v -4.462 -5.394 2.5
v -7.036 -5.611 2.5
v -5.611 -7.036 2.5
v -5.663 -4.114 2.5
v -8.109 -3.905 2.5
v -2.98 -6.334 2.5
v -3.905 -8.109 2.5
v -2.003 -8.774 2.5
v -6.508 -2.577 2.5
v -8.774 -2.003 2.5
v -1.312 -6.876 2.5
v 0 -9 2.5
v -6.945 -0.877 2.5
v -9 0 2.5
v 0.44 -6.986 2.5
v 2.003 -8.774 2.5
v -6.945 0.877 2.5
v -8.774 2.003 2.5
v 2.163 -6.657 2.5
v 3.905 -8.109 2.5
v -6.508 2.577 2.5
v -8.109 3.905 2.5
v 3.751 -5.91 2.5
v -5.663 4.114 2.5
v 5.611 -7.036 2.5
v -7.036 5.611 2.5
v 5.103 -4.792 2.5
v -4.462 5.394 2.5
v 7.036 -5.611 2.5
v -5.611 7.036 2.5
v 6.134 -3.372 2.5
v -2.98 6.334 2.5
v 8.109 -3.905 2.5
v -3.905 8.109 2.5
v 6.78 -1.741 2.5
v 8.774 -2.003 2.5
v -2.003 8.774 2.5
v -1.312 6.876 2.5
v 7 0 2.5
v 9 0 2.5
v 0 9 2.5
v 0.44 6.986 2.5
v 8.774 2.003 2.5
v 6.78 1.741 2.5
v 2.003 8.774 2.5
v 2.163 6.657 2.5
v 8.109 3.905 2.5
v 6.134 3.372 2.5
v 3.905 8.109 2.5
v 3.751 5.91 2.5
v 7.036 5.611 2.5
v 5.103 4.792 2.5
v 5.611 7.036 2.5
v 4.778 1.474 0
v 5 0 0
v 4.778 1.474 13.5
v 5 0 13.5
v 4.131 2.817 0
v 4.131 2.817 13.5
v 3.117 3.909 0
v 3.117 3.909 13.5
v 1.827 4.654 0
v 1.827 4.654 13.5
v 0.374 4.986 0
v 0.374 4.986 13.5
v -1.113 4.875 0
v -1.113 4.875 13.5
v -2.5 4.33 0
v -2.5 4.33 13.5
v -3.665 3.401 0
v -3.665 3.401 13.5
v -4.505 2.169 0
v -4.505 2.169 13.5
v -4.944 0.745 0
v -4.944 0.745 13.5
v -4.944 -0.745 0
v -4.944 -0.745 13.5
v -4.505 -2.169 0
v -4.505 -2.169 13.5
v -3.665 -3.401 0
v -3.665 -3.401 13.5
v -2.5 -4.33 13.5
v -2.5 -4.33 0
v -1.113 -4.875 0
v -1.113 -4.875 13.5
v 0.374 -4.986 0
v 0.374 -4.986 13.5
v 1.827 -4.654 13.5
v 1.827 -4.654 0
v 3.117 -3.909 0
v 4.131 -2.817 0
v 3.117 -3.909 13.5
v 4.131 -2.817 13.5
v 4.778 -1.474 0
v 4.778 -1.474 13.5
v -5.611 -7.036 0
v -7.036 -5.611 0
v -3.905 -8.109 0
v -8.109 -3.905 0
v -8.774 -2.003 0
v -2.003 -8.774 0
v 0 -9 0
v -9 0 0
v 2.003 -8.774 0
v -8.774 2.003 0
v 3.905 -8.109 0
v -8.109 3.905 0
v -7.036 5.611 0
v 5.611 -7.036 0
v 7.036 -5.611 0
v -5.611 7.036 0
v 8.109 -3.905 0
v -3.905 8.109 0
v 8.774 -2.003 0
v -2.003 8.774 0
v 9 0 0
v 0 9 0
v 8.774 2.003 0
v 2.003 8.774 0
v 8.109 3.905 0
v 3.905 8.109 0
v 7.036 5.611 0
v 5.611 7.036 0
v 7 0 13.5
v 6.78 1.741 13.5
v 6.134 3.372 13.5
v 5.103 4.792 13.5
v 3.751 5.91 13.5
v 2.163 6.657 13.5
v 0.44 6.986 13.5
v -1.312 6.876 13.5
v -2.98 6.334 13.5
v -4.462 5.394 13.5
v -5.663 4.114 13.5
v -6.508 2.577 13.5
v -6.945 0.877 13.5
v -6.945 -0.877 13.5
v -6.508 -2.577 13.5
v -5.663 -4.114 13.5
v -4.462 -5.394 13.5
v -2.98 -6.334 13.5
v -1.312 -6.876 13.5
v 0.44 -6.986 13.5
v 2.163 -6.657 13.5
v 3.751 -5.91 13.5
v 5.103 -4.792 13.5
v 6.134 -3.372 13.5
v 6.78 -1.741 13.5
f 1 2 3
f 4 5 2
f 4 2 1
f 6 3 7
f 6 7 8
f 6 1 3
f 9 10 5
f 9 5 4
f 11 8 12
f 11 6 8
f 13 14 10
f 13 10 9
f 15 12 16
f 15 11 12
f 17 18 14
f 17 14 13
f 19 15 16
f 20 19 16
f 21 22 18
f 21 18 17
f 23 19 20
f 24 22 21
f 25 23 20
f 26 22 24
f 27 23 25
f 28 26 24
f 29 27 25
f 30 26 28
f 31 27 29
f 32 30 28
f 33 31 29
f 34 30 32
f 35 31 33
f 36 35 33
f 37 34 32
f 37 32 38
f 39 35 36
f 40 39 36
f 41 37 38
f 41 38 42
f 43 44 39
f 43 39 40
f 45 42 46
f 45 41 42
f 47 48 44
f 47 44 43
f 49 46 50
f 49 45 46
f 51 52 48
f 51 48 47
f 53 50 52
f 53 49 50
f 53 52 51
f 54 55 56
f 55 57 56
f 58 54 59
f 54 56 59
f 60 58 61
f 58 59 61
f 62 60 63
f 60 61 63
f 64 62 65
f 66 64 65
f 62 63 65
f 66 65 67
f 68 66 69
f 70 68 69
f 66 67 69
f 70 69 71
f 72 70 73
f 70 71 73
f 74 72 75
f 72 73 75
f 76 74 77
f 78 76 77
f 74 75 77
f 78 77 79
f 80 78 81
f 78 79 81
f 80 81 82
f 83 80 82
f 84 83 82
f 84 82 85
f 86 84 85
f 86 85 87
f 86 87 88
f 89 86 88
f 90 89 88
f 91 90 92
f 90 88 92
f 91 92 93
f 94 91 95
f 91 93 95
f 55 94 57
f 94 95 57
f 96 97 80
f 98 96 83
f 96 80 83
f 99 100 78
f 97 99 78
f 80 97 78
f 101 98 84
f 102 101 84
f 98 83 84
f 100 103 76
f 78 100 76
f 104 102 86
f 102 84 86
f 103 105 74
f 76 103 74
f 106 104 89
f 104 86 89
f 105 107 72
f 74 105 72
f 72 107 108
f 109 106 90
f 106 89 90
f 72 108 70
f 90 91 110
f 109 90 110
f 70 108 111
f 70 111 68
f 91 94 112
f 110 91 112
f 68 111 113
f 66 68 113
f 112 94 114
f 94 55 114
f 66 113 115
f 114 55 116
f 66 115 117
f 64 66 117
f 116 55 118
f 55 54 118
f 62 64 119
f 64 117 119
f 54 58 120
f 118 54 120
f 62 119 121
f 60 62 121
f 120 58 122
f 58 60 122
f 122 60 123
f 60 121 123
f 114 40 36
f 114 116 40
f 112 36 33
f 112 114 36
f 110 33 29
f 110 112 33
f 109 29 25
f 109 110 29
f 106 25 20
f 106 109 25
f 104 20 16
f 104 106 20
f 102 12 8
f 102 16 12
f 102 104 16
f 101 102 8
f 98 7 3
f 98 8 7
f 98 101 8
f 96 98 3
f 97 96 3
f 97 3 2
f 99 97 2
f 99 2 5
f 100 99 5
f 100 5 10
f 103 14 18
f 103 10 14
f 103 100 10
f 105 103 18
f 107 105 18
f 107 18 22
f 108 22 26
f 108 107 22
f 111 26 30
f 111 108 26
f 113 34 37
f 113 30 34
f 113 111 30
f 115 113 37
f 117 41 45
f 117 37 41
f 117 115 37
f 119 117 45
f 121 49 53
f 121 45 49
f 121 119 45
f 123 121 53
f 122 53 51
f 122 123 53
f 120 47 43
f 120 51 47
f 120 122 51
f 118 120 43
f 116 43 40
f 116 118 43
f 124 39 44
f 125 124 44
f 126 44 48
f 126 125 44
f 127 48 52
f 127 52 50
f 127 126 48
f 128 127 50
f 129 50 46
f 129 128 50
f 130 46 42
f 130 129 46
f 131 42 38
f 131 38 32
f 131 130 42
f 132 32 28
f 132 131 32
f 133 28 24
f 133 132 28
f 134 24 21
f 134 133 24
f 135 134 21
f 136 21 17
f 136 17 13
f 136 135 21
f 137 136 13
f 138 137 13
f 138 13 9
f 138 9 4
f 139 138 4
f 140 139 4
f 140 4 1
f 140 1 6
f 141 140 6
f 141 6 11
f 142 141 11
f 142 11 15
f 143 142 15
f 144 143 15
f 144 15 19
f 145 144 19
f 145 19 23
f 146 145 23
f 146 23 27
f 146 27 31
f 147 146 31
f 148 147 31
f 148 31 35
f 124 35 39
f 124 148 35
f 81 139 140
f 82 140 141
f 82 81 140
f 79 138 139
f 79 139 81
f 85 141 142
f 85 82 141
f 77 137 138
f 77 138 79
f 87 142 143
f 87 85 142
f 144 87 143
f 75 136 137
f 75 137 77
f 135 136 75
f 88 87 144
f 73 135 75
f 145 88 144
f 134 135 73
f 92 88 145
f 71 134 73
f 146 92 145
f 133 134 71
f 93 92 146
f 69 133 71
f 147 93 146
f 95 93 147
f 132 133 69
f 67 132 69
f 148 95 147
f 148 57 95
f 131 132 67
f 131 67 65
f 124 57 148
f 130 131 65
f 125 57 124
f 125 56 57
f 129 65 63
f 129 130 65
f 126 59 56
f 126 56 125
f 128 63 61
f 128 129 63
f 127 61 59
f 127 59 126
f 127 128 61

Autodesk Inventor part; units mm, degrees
ref_plane "YZ Plane" through (0, 0, 0) normal (1, 0, 0) x (0, 1, 0)
ref_plane "XZ Plane" through (0, 0, 0) normal (0, 1, 0) x (-1, 0, 0)
ref_plane "XY Plane" through (0, 0, 0) normal (0, 0, 1) x (1, 0, 0)
sketch "Sketch1" plane through (0, 0, 0) normal (0, 0, 1) x (1, 0, 0)
  circle A0 centre (0, 0) radius 9
  dimension "d0" = 18
extrude "Extrusion1" add sketch "Sketch1" along normal blind 13.5
sketch "Sketch2" plane through (0, 0, 13.5) normal (0, 0, 1) x (1, 0, 0)
  circle A0 centre (0, 0) radius 9 projected
  circle A1 centre (0, 0) radius 7
  dimension "d3" = 14
extrude "Extrusion2" cut sketch "Sketch2" against normal blind 11
sketch "Sketch3" plane through (0, 0, 13.5) normal (0, 0, 1) x (1, 0, 0)
  circle A0 centre (0, 0) radius 7 projected
  circle A1 centre (0, 0) radius 5
  dimension "d6" = 10
extrude "Extrusion3" cut sketch "Sketch3" against normal blind 14 contours A1
properties part number "BUCHA DO MANCAL(41)" material "Bronze, Soft Tin"
